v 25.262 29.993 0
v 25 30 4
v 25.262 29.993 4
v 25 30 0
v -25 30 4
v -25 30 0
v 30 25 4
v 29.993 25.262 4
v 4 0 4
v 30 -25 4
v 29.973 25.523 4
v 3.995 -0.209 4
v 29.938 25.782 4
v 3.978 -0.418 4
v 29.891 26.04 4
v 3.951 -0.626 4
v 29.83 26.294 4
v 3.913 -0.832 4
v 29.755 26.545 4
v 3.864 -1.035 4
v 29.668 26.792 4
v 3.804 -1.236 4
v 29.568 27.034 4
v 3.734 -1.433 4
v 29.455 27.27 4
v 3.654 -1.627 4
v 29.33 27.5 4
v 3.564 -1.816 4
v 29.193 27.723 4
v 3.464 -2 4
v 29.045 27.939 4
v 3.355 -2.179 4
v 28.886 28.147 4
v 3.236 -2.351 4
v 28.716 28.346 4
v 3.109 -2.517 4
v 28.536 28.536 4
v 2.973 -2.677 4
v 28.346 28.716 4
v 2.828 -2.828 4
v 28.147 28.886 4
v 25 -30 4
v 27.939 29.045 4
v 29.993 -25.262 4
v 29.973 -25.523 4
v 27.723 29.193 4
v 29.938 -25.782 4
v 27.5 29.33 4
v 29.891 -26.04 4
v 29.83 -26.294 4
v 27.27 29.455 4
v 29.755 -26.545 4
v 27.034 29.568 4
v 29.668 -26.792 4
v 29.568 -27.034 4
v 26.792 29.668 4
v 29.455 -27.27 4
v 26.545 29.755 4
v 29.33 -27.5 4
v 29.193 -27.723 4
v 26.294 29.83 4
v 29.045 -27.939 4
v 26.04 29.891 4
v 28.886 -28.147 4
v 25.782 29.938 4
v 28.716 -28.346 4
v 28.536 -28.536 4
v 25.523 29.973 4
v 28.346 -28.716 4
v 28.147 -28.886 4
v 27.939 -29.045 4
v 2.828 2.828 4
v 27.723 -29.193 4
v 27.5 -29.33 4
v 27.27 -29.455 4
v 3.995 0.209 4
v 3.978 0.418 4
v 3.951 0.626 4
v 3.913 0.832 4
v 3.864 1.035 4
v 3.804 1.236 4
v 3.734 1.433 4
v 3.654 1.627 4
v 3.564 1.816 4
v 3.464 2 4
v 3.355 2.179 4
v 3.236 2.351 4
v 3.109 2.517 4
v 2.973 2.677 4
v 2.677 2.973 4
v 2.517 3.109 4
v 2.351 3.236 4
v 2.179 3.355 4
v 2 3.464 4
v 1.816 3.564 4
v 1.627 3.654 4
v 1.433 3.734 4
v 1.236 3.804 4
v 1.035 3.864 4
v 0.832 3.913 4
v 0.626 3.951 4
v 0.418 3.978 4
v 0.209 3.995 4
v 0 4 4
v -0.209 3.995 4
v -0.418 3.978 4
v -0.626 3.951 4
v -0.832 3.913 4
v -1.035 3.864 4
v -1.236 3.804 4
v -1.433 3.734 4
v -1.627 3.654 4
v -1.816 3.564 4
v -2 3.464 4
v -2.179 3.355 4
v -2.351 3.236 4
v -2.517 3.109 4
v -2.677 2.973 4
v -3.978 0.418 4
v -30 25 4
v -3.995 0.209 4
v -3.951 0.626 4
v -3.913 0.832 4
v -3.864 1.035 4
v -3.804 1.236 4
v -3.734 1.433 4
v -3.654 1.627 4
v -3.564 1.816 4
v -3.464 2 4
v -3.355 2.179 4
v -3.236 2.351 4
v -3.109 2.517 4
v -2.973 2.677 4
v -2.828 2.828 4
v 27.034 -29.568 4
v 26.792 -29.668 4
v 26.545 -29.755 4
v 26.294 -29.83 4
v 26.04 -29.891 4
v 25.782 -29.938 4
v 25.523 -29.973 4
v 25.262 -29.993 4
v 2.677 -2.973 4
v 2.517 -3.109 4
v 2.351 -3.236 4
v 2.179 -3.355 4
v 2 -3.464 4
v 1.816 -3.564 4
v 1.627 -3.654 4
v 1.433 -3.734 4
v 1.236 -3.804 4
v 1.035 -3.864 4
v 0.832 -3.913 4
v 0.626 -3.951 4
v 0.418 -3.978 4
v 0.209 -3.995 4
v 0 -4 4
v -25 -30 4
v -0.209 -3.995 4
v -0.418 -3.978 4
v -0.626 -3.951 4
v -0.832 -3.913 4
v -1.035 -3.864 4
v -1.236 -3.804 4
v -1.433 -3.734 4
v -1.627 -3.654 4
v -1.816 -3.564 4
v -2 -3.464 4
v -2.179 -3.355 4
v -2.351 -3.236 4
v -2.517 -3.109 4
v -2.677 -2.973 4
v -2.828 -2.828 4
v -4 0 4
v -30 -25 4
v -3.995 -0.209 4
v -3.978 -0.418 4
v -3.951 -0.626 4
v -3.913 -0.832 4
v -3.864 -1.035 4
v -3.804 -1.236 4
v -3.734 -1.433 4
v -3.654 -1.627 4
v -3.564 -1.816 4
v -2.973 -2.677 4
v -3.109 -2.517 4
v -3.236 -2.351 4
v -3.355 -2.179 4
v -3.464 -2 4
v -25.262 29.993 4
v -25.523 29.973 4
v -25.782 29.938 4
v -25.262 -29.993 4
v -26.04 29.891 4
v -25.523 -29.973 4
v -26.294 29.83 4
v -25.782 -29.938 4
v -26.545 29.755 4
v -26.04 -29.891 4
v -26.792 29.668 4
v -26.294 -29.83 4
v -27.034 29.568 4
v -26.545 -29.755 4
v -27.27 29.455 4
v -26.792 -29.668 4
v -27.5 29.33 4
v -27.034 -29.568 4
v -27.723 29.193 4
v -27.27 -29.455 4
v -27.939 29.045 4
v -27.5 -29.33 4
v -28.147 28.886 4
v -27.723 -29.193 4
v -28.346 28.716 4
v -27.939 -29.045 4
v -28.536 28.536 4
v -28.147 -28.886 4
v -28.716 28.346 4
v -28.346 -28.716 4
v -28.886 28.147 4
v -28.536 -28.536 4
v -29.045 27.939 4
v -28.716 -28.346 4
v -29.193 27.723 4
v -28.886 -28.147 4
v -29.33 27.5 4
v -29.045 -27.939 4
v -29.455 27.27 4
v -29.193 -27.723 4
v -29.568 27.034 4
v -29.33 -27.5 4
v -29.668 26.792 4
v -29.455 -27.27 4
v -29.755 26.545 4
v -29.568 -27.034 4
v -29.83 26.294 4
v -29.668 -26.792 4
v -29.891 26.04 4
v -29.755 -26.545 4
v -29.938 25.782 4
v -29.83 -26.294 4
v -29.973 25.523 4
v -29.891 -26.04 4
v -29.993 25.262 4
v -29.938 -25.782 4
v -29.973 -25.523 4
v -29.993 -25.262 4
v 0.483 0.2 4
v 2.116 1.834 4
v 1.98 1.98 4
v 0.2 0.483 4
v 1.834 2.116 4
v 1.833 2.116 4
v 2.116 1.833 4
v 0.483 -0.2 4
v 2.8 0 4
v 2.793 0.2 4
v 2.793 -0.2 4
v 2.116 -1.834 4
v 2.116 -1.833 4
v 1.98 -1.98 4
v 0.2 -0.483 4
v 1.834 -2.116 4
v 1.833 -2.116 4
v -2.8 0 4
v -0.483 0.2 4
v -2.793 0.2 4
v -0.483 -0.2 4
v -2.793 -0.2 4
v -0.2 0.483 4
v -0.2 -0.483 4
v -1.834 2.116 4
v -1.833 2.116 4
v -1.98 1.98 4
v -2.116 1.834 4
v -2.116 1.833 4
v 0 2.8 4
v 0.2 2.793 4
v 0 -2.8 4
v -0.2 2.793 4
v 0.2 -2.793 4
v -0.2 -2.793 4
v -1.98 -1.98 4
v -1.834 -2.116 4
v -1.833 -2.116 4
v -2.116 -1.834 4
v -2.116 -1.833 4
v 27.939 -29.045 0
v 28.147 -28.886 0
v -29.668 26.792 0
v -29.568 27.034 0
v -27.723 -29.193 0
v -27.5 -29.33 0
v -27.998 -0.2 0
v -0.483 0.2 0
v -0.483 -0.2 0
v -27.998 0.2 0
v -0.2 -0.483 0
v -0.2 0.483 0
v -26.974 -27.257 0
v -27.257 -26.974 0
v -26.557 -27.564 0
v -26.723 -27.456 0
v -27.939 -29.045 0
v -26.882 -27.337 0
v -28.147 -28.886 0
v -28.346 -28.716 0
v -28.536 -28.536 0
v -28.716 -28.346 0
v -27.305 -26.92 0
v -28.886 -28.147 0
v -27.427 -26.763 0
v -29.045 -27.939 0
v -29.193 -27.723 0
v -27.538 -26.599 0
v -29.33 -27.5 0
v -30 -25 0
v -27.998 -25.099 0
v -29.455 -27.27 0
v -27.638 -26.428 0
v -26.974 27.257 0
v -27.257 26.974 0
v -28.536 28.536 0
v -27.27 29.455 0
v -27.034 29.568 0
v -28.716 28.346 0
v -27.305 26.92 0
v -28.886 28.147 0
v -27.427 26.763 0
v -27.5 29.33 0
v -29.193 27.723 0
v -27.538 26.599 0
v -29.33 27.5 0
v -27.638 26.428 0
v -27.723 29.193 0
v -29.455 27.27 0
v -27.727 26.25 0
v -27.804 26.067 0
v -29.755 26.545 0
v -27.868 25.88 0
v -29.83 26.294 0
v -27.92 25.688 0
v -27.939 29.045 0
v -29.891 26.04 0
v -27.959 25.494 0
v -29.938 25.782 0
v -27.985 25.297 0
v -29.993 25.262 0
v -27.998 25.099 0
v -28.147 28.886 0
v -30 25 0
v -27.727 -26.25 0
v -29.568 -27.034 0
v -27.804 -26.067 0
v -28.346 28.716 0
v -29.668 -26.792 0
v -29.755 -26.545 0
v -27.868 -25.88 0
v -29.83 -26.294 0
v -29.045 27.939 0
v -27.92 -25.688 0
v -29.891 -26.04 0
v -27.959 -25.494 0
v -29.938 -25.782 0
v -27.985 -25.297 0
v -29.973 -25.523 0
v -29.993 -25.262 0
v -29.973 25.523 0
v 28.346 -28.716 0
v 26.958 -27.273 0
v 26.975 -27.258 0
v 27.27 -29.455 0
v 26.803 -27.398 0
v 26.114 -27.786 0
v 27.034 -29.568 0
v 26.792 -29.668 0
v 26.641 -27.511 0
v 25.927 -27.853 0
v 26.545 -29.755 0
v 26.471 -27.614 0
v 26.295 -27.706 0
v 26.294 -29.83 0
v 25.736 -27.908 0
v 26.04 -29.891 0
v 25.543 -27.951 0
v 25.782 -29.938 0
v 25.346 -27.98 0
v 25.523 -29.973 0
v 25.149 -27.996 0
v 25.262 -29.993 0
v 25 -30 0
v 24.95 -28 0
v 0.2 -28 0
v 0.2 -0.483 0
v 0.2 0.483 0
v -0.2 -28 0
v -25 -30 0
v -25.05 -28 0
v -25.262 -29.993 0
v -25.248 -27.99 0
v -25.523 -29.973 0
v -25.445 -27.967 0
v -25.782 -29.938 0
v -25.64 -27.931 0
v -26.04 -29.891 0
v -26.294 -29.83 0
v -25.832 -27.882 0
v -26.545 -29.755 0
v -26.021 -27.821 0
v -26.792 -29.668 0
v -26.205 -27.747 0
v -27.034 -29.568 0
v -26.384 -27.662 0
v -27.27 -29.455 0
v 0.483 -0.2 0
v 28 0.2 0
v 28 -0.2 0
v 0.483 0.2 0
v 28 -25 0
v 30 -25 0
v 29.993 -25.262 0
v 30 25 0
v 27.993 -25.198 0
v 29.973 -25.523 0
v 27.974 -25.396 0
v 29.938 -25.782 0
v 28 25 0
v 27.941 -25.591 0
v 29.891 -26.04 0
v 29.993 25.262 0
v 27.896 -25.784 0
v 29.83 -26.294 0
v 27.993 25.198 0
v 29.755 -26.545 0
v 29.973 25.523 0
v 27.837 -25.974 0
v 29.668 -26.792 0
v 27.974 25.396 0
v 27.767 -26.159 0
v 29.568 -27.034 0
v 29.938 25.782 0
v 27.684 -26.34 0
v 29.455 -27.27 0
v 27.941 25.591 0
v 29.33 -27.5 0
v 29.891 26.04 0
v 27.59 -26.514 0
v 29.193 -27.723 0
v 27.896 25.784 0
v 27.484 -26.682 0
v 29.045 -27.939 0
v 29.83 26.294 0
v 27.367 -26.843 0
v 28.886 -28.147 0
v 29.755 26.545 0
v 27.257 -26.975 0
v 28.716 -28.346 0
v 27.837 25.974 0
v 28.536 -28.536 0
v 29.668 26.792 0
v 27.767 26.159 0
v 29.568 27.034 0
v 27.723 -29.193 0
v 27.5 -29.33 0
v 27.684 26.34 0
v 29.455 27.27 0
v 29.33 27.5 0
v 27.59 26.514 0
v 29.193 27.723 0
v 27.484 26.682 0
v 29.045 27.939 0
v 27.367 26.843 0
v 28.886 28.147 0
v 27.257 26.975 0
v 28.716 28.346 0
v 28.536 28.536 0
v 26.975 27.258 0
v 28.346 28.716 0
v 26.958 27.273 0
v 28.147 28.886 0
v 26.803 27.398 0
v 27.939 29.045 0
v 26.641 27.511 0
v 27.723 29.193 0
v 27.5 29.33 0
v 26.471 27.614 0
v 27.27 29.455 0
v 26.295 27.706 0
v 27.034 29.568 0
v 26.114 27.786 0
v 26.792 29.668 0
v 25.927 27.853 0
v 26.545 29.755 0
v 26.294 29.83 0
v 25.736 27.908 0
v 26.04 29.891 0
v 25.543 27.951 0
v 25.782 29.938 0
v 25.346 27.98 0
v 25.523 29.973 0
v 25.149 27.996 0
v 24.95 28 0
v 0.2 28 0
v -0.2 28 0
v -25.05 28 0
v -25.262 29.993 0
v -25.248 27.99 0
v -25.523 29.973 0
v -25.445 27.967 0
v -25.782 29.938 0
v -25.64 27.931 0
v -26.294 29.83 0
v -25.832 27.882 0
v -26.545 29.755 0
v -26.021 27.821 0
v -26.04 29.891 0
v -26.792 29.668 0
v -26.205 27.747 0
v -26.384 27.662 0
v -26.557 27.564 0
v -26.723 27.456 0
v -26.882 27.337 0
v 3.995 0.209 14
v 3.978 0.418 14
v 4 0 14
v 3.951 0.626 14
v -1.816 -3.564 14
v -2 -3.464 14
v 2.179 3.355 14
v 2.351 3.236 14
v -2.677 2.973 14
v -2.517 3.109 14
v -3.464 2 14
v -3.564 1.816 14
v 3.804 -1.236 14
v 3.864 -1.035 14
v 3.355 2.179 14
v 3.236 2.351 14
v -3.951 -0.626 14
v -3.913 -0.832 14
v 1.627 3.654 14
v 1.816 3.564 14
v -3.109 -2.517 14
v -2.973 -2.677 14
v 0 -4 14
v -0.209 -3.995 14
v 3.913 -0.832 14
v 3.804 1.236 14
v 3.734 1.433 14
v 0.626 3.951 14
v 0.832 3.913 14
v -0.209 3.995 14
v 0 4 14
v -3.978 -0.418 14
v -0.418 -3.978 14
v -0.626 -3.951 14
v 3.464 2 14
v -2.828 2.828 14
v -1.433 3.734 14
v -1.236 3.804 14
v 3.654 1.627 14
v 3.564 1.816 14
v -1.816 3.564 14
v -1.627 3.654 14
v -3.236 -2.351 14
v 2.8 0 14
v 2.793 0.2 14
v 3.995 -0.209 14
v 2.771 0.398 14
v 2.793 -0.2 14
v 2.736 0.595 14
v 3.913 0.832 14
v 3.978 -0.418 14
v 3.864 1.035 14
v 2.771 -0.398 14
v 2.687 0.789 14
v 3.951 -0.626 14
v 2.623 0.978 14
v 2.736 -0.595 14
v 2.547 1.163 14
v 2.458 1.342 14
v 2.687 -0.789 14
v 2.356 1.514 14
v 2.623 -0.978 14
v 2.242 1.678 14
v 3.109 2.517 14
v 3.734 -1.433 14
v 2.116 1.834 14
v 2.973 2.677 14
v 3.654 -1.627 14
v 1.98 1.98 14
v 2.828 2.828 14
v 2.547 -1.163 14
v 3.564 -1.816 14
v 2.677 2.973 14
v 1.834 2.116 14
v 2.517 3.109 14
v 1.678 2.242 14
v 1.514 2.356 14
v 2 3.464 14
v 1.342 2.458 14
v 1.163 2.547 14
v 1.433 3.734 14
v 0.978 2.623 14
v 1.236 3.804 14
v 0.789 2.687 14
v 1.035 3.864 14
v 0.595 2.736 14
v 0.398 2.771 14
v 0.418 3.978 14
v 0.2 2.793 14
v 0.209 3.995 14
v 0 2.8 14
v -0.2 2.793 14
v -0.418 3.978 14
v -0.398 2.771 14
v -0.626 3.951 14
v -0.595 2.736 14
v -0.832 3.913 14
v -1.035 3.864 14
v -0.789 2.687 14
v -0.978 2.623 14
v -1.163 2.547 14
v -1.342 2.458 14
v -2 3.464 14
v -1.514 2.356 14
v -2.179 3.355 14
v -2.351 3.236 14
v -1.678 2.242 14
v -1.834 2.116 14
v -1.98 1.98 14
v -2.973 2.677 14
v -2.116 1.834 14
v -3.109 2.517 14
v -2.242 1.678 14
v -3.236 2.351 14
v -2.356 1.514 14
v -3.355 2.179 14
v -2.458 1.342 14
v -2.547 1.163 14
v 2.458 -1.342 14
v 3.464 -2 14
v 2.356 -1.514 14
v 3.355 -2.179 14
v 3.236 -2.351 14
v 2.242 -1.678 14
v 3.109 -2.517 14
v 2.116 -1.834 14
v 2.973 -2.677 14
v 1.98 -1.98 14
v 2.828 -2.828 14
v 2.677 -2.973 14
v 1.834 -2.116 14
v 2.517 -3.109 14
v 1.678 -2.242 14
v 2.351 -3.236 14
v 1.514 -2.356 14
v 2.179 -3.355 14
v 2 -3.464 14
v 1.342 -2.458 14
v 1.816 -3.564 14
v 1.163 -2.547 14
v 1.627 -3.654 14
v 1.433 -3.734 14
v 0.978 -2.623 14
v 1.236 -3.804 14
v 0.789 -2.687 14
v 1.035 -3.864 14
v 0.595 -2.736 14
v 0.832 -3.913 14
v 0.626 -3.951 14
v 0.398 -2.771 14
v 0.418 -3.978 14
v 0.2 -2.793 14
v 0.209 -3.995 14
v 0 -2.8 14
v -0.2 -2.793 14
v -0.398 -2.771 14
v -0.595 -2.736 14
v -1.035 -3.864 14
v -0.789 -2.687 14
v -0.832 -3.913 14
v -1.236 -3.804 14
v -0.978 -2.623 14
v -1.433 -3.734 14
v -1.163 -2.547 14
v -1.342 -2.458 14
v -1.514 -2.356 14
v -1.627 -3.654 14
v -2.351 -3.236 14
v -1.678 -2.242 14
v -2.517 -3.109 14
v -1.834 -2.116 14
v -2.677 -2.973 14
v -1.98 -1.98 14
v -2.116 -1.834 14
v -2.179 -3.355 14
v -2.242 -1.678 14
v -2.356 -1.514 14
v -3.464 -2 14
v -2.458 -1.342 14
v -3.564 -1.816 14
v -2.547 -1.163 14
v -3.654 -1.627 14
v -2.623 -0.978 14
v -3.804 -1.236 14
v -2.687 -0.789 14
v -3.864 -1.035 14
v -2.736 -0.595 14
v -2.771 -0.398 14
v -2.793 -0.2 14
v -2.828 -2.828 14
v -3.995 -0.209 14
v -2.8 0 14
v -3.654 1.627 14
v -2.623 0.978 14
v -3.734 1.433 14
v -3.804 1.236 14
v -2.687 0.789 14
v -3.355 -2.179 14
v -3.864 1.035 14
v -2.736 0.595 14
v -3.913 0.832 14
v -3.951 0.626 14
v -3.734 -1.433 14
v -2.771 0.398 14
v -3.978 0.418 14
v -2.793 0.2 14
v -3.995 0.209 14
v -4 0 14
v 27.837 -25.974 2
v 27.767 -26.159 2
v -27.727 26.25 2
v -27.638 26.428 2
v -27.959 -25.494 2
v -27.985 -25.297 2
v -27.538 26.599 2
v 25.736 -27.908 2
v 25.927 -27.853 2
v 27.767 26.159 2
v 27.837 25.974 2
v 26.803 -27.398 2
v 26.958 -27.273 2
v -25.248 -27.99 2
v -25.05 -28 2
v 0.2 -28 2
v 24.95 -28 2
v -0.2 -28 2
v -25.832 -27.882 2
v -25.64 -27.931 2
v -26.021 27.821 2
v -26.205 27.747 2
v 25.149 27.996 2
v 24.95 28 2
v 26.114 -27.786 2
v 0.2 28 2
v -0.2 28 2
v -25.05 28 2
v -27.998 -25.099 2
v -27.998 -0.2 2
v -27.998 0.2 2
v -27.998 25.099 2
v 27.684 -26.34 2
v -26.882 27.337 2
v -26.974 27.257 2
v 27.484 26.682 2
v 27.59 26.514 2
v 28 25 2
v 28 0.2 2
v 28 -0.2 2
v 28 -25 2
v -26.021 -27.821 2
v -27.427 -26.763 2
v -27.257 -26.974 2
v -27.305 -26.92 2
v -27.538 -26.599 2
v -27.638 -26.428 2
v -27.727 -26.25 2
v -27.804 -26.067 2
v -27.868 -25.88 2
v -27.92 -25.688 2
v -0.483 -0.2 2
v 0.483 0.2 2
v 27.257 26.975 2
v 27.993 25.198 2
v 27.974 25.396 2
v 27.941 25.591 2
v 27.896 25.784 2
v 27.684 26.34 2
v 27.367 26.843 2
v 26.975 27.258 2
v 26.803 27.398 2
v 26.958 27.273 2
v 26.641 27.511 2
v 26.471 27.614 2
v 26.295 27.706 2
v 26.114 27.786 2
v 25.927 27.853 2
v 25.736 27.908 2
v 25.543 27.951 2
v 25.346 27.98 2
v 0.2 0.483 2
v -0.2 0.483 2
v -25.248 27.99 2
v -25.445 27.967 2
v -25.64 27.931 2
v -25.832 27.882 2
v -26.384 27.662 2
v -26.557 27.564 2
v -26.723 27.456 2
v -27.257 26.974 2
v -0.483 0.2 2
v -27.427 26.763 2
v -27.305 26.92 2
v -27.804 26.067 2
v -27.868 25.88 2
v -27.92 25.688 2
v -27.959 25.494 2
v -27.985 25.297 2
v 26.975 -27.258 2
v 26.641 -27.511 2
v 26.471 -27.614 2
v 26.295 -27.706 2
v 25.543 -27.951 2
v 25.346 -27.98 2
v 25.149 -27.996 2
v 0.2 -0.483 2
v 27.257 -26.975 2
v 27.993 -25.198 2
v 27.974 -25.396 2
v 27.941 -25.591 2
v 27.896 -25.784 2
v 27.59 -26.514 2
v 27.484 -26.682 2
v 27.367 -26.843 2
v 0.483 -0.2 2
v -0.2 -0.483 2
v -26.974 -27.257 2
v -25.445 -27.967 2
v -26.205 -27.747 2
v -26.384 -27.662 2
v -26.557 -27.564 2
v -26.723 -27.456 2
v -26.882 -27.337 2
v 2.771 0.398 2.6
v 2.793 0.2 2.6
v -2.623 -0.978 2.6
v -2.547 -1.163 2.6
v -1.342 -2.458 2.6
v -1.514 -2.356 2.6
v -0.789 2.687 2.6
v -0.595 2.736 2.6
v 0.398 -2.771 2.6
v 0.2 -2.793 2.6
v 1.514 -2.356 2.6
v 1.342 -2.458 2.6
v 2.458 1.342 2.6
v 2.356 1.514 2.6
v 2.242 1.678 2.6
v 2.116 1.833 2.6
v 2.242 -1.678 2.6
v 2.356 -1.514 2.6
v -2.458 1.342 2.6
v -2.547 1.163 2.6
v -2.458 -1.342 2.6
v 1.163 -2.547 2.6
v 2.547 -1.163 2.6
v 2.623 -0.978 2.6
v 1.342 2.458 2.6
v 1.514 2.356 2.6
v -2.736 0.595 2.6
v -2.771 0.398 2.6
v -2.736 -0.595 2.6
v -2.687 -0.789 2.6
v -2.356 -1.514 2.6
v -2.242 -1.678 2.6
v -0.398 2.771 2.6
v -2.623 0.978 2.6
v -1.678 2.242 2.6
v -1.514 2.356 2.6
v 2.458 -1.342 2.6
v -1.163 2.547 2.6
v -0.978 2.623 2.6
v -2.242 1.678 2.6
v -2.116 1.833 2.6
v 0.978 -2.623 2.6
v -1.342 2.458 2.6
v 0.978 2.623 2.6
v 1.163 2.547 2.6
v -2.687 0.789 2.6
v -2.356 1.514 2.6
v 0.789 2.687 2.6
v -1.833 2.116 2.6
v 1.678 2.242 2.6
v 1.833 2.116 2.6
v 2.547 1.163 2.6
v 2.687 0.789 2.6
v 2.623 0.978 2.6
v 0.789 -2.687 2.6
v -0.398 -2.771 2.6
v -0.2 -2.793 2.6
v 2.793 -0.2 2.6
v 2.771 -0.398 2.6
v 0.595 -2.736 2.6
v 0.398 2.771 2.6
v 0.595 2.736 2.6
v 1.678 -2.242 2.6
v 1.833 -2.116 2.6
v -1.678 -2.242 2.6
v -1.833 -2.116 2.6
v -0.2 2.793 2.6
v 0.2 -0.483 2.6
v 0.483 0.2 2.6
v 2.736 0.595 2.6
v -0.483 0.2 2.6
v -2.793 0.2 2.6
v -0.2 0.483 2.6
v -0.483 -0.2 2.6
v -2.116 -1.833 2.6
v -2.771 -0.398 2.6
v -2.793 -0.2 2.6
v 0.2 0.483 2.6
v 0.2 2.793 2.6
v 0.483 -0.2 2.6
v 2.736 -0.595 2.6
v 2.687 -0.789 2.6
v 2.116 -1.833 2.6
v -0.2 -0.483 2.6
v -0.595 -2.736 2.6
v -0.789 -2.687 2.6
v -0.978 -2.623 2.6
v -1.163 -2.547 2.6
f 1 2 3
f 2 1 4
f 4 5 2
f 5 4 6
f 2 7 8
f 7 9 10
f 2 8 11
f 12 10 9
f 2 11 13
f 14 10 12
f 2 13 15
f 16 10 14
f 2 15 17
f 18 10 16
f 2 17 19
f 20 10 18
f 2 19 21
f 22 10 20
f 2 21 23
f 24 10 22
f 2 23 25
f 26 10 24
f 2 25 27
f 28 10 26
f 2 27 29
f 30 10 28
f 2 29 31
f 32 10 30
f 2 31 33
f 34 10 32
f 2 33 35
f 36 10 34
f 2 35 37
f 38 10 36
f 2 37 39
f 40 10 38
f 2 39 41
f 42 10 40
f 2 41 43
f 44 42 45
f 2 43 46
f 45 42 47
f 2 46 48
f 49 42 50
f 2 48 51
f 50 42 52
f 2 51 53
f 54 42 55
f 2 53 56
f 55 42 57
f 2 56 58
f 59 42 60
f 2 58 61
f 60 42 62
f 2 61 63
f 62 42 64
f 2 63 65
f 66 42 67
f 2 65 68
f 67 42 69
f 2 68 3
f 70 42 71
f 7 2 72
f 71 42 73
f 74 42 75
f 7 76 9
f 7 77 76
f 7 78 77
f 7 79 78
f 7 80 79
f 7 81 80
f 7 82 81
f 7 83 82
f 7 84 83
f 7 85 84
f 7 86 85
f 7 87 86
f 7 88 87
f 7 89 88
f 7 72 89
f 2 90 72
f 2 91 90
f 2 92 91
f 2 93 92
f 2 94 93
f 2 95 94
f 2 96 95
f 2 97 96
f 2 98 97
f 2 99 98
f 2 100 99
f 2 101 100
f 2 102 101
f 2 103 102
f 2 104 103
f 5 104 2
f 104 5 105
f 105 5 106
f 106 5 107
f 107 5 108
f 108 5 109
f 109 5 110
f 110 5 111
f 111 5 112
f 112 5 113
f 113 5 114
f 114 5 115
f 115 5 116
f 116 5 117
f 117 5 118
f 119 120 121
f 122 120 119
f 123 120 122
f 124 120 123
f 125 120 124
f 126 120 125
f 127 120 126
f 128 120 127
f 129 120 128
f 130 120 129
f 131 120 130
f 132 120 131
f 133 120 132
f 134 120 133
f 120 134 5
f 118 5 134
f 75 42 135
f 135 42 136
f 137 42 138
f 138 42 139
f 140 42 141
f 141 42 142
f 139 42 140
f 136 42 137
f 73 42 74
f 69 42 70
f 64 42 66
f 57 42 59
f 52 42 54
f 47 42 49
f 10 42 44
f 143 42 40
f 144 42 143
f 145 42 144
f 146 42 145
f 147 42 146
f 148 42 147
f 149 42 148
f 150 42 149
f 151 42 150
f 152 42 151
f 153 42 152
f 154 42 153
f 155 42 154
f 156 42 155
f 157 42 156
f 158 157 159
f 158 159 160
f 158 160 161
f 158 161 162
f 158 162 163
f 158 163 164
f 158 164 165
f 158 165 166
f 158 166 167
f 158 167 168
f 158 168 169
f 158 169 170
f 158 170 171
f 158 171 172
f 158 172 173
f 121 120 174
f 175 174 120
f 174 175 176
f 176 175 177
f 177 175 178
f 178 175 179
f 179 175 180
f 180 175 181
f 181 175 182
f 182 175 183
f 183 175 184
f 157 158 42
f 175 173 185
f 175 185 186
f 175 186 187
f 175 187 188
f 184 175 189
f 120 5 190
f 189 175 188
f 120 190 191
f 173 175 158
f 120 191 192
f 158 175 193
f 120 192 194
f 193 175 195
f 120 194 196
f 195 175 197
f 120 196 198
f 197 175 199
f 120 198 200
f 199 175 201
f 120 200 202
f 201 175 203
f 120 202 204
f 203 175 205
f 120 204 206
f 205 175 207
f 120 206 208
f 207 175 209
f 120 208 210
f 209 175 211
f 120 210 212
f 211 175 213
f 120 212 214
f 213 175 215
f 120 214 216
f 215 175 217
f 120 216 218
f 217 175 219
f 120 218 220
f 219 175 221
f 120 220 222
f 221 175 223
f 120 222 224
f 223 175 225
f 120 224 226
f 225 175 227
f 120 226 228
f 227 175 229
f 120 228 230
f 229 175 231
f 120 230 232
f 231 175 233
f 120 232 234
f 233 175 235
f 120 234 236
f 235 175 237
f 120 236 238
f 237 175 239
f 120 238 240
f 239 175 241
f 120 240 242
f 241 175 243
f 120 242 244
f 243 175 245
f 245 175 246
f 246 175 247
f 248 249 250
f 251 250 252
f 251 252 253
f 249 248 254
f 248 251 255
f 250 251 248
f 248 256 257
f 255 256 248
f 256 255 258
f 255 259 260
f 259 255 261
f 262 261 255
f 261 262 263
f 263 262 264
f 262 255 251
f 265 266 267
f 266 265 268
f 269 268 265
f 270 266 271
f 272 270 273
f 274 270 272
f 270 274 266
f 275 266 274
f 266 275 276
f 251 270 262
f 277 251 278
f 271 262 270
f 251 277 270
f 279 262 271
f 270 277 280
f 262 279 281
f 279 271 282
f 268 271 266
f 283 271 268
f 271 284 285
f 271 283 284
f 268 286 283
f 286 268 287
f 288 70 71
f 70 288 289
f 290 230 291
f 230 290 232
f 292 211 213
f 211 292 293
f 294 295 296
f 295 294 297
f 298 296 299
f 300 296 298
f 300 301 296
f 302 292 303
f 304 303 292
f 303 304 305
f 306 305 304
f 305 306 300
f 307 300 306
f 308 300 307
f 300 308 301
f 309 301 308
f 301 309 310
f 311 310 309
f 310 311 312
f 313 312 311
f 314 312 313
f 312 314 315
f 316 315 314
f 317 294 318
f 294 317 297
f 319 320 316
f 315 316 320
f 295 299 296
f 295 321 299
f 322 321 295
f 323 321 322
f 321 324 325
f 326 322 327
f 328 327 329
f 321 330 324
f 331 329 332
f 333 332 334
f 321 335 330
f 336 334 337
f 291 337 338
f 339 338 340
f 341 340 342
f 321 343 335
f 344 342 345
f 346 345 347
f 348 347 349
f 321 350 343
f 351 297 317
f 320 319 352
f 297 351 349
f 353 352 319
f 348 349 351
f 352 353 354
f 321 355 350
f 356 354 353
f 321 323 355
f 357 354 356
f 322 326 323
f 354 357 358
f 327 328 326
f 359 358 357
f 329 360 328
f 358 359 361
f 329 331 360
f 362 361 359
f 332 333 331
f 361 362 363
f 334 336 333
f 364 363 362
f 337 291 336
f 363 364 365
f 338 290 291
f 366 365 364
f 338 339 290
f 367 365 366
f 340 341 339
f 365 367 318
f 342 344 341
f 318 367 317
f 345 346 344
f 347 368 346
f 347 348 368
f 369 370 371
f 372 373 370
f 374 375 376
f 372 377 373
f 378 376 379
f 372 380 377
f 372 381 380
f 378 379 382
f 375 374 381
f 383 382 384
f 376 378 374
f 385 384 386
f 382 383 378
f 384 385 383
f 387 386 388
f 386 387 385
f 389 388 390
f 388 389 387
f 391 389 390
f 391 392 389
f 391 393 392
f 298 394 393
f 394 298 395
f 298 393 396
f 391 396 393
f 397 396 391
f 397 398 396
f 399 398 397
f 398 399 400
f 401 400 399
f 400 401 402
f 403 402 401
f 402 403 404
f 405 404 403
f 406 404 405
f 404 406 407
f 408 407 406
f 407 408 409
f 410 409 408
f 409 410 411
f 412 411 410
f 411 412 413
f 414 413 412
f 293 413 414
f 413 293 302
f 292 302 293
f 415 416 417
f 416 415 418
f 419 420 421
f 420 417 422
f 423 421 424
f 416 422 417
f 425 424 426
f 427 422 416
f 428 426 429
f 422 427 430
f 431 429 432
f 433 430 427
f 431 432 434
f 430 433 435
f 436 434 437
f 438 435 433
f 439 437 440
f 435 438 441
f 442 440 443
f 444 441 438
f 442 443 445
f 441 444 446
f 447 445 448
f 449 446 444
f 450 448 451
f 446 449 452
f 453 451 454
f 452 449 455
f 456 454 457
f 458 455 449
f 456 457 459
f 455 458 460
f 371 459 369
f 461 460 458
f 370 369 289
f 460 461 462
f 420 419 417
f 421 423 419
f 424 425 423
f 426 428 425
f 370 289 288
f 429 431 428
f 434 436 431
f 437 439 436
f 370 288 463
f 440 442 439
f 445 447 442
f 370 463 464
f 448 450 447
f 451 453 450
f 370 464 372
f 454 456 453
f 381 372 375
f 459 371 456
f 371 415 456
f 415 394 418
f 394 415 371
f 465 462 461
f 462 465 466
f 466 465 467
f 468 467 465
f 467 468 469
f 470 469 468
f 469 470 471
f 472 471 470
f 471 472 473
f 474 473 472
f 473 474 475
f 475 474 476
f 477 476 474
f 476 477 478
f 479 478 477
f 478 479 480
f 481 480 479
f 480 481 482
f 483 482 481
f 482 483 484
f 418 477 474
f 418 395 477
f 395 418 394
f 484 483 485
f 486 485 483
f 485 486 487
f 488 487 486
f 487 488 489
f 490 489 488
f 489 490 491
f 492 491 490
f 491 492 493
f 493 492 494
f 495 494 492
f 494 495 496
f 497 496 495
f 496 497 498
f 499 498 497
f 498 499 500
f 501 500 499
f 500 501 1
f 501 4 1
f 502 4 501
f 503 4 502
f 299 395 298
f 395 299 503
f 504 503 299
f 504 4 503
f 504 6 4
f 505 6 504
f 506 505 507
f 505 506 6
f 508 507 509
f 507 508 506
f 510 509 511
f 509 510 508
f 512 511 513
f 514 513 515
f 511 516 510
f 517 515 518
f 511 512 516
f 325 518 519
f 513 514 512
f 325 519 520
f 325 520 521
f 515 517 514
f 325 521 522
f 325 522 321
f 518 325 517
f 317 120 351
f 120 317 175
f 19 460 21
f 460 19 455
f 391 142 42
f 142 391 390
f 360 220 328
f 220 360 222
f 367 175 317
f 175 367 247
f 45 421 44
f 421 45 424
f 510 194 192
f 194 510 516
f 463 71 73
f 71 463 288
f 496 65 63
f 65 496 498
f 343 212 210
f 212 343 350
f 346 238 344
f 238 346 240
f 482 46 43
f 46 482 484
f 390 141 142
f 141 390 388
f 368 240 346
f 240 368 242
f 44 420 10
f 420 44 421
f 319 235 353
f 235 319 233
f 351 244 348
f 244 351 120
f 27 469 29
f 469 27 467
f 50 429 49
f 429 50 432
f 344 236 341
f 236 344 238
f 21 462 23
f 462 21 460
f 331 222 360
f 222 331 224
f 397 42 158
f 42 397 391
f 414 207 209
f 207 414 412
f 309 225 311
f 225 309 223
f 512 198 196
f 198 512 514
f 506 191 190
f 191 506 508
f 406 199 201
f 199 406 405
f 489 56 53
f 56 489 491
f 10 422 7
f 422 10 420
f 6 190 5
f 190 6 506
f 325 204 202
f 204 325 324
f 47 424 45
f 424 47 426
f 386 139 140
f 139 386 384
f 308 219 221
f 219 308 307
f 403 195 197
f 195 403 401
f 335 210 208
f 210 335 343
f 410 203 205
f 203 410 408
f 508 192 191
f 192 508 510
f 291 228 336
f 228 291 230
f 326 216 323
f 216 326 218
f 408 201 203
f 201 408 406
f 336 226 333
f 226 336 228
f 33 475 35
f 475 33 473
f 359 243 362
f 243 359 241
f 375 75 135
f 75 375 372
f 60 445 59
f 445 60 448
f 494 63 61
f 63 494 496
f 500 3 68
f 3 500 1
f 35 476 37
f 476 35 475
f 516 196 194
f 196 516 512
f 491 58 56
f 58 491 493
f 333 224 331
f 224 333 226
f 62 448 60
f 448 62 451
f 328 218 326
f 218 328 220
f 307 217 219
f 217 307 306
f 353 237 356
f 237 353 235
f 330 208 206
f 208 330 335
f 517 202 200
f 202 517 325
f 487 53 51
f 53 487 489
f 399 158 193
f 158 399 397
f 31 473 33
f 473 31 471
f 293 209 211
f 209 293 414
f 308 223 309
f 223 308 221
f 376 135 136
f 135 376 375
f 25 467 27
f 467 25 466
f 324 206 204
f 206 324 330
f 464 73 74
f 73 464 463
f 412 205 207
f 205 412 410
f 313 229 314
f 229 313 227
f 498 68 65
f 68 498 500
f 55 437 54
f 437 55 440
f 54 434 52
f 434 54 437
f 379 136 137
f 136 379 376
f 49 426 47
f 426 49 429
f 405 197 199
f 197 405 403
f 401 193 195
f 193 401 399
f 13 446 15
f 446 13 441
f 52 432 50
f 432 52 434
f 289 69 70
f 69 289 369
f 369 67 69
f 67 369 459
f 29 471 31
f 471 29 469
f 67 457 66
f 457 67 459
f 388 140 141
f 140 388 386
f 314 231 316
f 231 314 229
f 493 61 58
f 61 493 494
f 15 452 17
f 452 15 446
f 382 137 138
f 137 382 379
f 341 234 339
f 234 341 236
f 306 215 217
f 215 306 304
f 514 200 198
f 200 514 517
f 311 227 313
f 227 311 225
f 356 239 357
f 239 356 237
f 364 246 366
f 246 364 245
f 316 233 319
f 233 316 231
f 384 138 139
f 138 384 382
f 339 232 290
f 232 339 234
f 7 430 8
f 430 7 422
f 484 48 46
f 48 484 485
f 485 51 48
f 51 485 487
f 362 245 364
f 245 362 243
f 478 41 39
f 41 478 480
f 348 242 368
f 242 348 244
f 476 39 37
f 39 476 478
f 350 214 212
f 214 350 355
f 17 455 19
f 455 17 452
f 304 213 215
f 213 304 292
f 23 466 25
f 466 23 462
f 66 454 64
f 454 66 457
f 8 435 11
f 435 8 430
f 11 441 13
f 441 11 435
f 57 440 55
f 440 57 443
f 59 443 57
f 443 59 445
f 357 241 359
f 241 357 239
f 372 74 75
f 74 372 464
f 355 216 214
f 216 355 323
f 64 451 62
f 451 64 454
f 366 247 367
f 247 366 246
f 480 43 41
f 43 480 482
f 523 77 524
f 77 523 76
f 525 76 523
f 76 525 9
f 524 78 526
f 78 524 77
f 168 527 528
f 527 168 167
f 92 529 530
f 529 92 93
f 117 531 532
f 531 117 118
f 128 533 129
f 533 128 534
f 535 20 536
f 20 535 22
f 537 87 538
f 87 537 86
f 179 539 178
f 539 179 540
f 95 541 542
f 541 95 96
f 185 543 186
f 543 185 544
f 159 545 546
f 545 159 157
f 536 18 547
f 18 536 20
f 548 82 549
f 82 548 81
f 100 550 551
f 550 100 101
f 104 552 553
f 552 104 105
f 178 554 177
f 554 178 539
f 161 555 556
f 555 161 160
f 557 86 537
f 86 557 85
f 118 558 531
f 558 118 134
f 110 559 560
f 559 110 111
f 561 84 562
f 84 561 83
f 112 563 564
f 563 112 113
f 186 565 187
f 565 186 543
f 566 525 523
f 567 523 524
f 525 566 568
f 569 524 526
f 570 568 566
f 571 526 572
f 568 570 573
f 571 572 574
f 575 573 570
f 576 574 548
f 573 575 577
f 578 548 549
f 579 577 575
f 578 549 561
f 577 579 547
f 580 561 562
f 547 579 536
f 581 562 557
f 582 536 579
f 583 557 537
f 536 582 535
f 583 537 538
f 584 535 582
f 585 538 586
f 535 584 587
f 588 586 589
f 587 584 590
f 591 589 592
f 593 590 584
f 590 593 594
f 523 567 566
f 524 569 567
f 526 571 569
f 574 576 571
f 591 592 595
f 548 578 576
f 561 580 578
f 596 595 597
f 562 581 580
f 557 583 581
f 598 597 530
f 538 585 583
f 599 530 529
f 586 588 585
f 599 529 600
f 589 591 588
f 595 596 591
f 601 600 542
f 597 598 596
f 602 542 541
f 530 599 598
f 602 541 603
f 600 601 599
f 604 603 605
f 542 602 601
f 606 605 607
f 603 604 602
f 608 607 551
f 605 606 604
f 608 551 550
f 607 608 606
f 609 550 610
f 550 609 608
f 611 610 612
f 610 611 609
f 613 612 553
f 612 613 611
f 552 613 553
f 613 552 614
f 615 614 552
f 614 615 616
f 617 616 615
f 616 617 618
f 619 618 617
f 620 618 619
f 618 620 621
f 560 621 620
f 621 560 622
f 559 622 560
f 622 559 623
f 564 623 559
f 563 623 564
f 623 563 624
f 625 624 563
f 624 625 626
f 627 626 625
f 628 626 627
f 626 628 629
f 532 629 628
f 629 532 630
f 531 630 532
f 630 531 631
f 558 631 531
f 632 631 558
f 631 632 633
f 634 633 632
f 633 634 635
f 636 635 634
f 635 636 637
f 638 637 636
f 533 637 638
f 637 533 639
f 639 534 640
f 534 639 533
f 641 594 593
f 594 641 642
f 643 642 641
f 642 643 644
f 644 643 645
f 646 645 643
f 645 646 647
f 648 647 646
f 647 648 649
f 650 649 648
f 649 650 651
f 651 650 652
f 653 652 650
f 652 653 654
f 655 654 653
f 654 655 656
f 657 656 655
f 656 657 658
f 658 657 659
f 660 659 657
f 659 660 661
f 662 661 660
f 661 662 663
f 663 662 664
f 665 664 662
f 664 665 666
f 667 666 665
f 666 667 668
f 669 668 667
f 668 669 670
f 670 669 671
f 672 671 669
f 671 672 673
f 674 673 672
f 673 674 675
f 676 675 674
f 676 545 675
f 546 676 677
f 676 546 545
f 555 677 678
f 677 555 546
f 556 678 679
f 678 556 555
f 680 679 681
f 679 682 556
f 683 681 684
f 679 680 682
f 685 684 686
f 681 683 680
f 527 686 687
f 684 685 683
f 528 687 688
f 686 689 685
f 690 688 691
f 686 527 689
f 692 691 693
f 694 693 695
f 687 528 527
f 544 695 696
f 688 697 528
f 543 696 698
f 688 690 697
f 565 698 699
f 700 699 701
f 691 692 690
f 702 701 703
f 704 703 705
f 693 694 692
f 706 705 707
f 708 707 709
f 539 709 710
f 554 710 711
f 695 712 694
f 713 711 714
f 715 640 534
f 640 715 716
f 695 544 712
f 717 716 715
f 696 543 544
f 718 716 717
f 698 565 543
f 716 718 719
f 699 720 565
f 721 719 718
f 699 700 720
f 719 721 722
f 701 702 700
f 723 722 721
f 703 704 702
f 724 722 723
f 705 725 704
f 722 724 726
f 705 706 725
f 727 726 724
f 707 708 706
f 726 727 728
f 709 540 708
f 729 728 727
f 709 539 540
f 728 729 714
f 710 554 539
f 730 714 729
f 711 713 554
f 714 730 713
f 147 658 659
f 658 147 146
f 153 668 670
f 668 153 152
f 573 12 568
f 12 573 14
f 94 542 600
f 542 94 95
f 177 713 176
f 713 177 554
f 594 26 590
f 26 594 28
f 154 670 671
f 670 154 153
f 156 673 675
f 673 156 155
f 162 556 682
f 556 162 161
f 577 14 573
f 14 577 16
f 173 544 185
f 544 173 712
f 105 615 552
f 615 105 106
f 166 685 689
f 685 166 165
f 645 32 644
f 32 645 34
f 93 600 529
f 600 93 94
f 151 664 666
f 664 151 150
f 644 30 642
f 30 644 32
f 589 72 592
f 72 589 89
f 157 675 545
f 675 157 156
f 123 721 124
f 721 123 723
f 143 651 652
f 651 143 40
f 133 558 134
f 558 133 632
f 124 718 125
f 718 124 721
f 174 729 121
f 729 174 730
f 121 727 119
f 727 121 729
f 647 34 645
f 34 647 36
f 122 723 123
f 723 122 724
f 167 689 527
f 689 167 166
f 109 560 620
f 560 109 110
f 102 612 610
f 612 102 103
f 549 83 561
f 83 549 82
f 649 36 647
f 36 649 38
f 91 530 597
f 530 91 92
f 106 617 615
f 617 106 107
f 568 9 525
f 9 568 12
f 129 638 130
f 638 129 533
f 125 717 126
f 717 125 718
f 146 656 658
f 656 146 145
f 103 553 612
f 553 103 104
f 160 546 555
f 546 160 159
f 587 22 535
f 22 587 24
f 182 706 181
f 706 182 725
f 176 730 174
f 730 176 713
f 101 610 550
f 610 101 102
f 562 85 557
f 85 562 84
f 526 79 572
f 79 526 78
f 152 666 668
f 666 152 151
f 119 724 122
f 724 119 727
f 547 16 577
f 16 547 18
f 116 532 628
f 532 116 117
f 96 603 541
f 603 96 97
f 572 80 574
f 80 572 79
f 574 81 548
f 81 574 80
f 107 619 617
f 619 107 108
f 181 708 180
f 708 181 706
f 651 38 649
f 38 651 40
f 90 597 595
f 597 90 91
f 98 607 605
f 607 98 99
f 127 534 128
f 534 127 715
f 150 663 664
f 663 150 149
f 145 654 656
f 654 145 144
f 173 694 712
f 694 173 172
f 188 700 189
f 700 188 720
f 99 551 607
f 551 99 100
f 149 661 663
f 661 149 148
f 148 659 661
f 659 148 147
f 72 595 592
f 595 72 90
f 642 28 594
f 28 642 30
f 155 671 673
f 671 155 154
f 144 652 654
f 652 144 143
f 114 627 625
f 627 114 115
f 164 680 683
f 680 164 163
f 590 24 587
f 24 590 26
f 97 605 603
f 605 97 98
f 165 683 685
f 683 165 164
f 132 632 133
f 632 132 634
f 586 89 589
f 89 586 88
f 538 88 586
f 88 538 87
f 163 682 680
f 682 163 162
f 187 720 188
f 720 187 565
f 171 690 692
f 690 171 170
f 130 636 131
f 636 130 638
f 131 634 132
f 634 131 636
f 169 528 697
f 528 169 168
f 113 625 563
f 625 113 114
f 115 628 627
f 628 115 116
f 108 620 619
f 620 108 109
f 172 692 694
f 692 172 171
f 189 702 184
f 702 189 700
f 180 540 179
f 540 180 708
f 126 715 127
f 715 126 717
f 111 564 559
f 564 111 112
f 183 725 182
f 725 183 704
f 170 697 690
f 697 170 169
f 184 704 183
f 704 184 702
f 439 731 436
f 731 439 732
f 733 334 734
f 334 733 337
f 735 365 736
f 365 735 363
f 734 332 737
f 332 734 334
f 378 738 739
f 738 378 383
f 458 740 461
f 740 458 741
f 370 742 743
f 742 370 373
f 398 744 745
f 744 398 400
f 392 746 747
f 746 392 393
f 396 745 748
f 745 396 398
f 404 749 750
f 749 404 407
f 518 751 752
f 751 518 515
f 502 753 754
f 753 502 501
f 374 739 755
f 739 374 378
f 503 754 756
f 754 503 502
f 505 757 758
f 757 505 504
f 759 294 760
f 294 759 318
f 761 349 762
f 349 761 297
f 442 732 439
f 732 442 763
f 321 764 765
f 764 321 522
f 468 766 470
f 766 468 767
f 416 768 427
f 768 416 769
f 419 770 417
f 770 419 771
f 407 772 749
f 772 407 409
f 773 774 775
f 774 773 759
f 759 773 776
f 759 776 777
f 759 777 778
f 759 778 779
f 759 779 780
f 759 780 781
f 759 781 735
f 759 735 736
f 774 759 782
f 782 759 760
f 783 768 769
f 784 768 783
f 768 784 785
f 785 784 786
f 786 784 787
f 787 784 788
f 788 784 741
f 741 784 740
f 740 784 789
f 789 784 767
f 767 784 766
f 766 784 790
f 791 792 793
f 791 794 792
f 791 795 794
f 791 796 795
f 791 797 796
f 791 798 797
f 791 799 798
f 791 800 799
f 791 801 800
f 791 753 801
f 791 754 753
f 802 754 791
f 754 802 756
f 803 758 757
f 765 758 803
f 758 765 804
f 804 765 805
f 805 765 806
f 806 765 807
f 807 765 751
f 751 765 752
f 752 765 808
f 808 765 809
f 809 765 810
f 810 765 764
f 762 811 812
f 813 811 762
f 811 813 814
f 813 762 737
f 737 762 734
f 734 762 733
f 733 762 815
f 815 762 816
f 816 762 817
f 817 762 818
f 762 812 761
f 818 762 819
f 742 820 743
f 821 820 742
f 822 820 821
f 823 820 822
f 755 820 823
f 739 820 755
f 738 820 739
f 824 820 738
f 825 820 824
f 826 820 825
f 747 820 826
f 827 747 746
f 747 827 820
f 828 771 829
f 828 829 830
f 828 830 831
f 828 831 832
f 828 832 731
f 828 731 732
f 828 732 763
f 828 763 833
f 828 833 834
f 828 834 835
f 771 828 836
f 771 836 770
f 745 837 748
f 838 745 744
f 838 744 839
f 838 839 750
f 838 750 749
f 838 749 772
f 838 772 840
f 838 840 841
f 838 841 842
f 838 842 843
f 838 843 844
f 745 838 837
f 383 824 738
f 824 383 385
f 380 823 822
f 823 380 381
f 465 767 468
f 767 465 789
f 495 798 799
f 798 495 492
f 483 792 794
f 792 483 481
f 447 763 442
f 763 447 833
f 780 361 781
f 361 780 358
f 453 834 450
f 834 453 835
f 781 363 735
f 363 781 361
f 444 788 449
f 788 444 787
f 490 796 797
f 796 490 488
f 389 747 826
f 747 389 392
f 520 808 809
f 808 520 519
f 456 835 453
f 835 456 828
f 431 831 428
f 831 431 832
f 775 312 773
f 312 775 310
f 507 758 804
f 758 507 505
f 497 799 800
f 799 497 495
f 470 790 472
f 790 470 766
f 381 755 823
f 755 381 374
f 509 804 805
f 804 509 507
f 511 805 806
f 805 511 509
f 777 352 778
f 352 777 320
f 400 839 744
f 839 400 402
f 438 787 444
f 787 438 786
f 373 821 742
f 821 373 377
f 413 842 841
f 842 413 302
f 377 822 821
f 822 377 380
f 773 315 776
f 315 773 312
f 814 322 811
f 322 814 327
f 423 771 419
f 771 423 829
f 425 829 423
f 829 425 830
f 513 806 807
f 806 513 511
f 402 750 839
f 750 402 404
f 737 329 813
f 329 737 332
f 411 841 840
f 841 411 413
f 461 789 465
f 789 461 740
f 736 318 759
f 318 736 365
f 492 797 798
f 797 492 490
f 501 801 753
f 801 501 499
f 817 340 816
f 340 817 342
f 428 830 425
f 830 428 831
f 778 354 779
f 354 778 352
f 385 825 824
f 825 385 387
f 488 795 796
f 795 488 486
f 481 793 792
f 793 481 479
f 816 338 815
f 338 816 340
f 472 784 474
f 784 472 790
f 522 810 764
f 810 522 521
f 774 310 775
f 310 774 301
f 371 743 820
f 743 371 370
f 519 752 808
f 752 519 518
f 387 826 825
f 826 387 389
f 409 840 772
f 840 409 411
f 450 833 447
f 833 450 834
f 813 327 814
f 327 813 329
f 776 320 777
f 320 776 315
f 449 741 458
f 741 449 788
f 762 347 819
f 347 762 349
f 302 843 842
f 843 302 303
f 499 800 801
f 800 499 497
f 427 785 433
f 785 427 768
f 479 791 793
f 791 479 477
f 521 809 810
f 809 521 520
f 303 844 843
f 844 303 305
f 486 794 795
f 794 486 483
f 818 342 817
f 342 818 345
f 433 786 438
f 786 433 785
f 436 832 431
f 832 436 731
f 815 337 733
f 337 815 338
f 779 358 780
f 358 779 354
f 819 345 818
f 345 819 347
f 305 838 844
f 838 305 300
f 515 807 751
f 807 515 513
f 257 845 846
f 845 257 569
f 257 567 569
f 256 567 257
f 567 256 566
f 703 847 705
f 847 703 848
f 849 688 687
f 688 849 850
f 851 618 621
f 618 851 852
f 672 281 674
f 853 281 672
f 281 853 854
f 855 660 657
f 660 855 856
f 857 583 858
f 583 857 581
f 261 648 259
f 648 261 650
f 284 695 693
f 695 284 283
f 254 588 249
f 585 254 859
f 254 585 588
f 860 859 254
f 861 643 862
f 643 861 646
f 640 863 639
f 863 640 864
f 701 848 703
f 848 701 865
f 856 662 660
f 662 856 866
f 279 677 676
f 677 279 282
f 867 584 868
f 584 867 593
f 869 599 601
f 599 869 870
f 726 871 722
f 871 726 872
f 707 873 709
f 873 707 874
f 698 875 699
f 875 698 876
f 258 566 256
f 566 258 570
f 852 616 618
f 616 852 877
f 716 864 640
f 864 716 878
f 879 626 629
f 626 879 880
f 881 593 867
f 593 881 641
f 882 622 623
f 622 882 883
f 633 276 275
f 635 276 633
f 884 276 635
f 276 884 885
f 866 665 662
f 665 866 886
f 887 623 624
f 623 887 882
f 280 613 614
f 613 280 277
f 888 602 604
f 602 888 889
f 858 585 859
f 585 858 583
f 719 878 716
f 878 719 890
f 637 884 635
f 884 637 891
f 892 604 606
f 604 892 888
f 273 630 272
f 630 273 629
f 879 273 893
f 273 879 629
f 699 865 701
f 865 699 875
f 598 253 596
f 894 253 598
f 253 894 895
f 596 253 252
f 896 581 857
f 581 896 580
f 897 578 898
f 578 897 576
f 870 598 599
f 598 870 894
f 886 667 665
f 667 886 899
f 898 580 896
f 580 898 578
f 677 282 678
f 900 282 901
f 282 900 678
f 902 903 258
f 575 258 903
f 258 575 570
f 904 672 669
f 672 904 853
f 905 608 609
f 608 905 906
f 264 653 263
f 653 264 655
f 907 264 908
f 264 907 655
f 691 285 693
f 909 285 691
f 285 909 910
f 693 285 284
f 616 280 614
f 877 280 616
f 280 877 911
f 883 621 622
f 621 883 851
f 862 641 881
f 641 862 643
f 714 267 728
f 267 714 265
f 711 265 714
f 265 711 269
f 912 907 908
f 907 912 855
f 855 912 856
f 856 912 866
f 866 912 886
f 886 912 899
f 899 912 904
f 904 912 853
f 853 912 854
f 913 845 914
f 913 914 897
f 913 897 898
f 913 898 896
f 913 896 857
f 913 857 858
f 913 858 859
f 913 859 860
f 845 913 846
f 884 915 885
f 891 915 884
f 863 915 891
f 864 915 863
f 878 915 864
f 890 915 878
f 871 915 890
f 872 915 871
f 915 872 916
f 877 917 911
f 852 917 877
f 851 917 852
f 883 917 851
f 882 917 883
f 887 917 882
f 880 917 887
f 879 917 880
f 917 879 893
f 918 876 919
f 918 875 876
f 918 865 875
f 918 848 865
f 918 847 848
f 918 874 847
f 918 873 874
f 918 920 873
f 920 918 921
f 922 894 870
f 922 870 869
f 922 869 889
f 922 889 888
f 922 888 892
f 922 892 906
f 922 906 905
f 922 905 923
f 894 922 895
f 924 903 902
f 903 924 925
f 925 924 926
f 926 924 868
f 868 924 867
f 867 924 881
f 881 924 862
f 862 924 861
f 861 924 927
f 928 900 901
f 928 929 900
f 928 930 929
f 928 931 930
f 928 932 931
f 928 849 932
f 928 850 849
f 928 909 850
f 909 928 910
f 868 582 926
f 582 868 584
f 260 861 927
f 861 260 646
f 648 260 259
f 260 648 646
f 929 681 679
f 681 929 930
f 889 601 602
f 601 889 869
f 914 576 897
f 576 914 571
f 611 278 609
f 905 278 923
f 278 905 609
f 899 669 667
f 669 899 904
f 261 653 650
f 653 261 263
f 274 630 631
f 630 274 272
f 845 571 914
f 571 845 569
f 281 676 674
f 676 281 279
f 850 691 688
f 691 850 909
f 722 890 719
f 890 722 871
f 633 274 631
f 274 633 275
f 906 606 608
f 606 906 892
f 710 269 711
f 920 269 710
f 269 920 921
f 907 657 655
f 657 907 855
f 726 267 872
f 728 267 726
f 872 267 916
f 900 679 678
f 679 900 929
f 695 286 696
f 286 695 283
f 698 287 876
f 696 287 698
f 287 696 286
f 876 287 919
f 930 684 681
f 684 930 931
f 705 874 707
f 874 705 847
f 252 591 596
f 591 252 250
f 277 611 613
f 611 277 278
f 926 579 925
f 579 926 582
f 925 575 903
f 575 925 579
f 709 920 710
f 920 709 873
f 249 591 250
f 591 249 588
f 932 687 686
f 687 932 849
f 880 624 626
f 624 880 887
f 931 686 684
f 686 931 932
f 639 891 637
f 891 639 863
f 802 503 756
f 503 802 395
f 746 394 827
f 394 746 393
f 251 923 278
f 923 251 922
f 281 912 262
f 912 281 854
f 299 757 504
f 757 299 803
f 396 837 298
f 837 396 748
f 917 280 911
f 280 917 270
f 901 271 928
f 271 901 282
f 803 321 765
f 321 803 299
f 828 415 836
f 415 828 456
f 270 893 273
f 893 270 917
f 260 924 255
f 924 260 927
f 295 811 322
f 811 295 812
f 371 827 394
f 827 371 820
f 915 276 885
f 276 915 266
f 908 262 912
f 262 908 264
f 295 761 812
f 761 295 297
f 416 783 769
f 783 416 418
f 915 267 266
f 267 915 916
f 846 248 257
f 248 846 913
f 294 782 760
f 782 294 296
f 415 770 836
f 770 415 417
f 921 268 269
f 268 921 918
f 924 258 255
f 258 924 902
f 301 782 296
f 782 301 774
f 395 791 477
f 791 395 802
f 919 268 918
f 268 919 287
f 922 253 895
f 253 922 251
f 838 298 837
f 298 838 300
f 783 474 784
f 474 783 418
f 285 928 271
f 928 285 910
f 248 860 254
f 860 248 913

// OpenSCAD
// file: dimensions.scad
// (C) 2023 Dmytry Lavrov.
// Common dimensions for Marionette configuration

glass_w=316;
glass_h=316;
glass_t=3.9;

// margin around glass edge that will be unreachable
movement_margin=30;

mm_per_revolution=40;
winch_r=mm_per_revolution/(2*PI);

winch_clearance=4;

winch_offset=winch_r/sqrt(2) + winch_clearance;

upper_winch_r=winch_r;

winch_ratio=1.5;

lower_winch_r=winch_r/winch_ratio;

motor_hole_gap=31;
motor_hole_r=1.65;
motor_screw_head_r=3.5;
motor_screw_l=16;

motor_hole_depth=3.5;

motor_margin=3;
motor_w=42+2*motor_margin;

motor_bump_r=11.5;
motor_bump_h=2;

motor_shaft_l=22;

motor_shaft_r=2.5;
d_cutout_l=15;
d_cutout_depth=0.5;

cable_r=0.5;

// too short:
//winch_l=40;//motor_shaft_l;
winch_l=50;//75;

plate_t=motor_screw_l-motor_hole_depth;



cable_tension=30;

he_bearing_or=11/2;
he_bearing_h=4;
he_bearing_ir=2;

tiny_bearing_or=7/2;
tiny_bearing_ir=3/2;
tiny_bearing_h=3;

steel_shaft_r=2;

idler_screw_r=3.8/2;
idler_screw_head_r=7.5/2;
idler_r=7;
idler_h=6;
idler_ir=2;
// radius where rope wraps
idler_rr=4.75;


diagonal_length=norm([glass_w-movement_margin*2, glass_h-movement_margin*2]);
winch_turns=diagonal_length/mm_per_revolution;
upper_cable_length=norm([glass_w-movement_margin, glass_h-movement_margin])+5*upper_winch_r+50;

echo("The winch will have", winch_turns, "turns");

echo("Upper cable length is", upper_cable_length);

module motor_shaft(expand=0){
    difference(){
        up(-2)cylinder(motor_shaft_l+4, r=motor_shaft_r+expand);
        box([-motor_shaft_r, motor_shaft_r+expand-d_cutout_depth, motor_shaft_l-d_cutout_l], [motor_shaft_r, motor_shaft_r+1, motor_shaft_l+1]);
    }
}
// file: ../common/common.scad
// (C) 2023 Dmytry Lavrov

module box(low, high){
    translate(low){
        cube(high-low);
    }
}

module mirror_duplicate(v){
    children();
    mirror(v=v)children();
}

module x_mirror(){
    mirror_duplicate(v=[1,0,0])children();
}
module y_mirror(){
    mirror_duplicate(v=[0,1,0])children();
}
module xy_mirror(){
    mirror_duplicate(v=[1,0,0])mirror_duplicate(v=[0,1,0])children();
}

module four_corners(low, high){
    translate([low[0], low[1], 0])children();
    translate([high[0], low[1], 0])children();
    translate([high[0], high[1], 0])children();
    translate([low[0], high[1], 0])children();  
}

module cyl_rounded_box(low, high, r){
    h=high[2]-low[2];
    translate([0, 0, low[2]]){
        hull(){
            translate([low[0]+r, low[1]+r, 0])cylinder(h, r=r);
            translate([high[0]-r, low[1]+r, 0])cylinder(h, r=r);
            translate([high[0]-r, high[1]-r, 0])cylinder(h, r=r);
            translate([low[0]+r, high[1]-r, 0])cylinder(h, r=r);
        }
    }
}

module rounded_box(l, h, r){
    hull(){
        translate([l[0]+r, l[1]+r, l[2]+r])sphere(r);        
        translate([l[0]+r, l[1]+r, h[2]-r]) sphere(r);
        translate([l[0]+r, h[1]-r, l[2]+r]) sphere(r);
        translate([l[0]+r, h[1]-r, h[2]-r]) sphere(r);
        
        translate([h[0]-r, l[1]+r, l[2]+r]) sphere(r);
        translate([h[0]-r, l[1]+r, h[2]-r]) sphere(r);
        translate([h[0]-r, h[1]-r, l[2]+r]) sphere(r);
        translate([h[0]-r, h[1]-r, h[2]-r]) sphere(r);
    }
}

module skel_cyl_rounded_box(low, high, ir, or, outer=true, right_side=true){
    h=high[2]-low[2];
    translate([0, 0, low[2]])
    difference(){
        union(){
            translate([low[0], low[1], 0])cylinder(h, r=or);
            translate([high[0], low[1], 0])cylinder(h, r=or);
            translate([high[0], high[1], 0])cylinder(h, r=or);
            translate([low[0], high[1], 0])cylinder(h, r=or);
            // outer shell
            if(outer){
                box([low[0], low[1]-or, 0], [high[0], low[1]-ir, h]);            
                box([low[0], high[1]+ir, 0], [high[0], high[1]+or, h]);
                
                box([low[0]-or, low[1], 0], [low[0]-ir, high[1], h]);
                
                if(right_side)box([high[0]+ir, low[1], 0], [high[0]+or, high[1], h]);
            }

            // inner shell            
            box([low[0], low[1]+ir, 0], [high[0], low[1]+or, h]);            
            box([low[0], high[1]-or, 0], [high[0], high[1]-ir, h]);
            
            box([low[0]+ir, low[1], 0], [low[0]+or, high[1], h]);
            box([high[0]-or, low[1], 0], [high[0]-ir, high[1], h]);
        }
        translate([low[0], low[1], 0])cylinder(h, r=ir);
        translate([high[0], low[1], 0])cylinder(h, r=ir);
        translate([high[0], high[1], 0])cylinder(h, r=ir);
        translate([low[0], high[1], 0])cylinder(h, r=ir);
    }
}

module sequential_hull(){
    if($children<2){
        hull()children();
    }else{
        for (i = [0: $children-2])
            hull(){
                children(i);
                children(i+1);
            }
    }
}

module teardrop(r){// sphere with a hat, purpose: avoid overhangs
    union(){
        sphere(r);
        translate([0,0,r*sqrt(0.5)])cylinder(r*sqrt(0.5), r1=r*sqrt(0.5), r2=0);
    }
}

module up(z){
    translate([0,0,z])children();
}
// main file
use <../common/common.scad>
include <dimensions.scad>
$fa=3;
$fs=0.2;
large=100;

hose_ir=4;
inlet_wall_t=1.2;

restrictor_t=0.6;

module OUT_infill(){
}

module OUT_air_bearing(){
    s=movement_margin;
    base_t=4;
    t=2;
    
 
    difference(){
        union(){
            cyl_rounded_box([-s, -s, 0], [s, s, base_t], 5);
            up(base_t)cylinder(10, r=hose_ir);            
        }
        cyl_rounded_box([-s+t, -s+t, 0], [s-t, s-t, base_t-t], 5-t);
        up(base_t-t+restrictor_t)cylinder(large, r=hose_ir-inlet_wall_t);
    }
    intersection(){
        cyl_rounded_box([-s, -s, 0], [s, s, base_t], 5);
        for(i=[0:7])rotate([0,0,i*45]){
            box([-0.2, -large, -large], [0.2, large, large]);
        }
    }
    
}
OUT_air_bearing();
